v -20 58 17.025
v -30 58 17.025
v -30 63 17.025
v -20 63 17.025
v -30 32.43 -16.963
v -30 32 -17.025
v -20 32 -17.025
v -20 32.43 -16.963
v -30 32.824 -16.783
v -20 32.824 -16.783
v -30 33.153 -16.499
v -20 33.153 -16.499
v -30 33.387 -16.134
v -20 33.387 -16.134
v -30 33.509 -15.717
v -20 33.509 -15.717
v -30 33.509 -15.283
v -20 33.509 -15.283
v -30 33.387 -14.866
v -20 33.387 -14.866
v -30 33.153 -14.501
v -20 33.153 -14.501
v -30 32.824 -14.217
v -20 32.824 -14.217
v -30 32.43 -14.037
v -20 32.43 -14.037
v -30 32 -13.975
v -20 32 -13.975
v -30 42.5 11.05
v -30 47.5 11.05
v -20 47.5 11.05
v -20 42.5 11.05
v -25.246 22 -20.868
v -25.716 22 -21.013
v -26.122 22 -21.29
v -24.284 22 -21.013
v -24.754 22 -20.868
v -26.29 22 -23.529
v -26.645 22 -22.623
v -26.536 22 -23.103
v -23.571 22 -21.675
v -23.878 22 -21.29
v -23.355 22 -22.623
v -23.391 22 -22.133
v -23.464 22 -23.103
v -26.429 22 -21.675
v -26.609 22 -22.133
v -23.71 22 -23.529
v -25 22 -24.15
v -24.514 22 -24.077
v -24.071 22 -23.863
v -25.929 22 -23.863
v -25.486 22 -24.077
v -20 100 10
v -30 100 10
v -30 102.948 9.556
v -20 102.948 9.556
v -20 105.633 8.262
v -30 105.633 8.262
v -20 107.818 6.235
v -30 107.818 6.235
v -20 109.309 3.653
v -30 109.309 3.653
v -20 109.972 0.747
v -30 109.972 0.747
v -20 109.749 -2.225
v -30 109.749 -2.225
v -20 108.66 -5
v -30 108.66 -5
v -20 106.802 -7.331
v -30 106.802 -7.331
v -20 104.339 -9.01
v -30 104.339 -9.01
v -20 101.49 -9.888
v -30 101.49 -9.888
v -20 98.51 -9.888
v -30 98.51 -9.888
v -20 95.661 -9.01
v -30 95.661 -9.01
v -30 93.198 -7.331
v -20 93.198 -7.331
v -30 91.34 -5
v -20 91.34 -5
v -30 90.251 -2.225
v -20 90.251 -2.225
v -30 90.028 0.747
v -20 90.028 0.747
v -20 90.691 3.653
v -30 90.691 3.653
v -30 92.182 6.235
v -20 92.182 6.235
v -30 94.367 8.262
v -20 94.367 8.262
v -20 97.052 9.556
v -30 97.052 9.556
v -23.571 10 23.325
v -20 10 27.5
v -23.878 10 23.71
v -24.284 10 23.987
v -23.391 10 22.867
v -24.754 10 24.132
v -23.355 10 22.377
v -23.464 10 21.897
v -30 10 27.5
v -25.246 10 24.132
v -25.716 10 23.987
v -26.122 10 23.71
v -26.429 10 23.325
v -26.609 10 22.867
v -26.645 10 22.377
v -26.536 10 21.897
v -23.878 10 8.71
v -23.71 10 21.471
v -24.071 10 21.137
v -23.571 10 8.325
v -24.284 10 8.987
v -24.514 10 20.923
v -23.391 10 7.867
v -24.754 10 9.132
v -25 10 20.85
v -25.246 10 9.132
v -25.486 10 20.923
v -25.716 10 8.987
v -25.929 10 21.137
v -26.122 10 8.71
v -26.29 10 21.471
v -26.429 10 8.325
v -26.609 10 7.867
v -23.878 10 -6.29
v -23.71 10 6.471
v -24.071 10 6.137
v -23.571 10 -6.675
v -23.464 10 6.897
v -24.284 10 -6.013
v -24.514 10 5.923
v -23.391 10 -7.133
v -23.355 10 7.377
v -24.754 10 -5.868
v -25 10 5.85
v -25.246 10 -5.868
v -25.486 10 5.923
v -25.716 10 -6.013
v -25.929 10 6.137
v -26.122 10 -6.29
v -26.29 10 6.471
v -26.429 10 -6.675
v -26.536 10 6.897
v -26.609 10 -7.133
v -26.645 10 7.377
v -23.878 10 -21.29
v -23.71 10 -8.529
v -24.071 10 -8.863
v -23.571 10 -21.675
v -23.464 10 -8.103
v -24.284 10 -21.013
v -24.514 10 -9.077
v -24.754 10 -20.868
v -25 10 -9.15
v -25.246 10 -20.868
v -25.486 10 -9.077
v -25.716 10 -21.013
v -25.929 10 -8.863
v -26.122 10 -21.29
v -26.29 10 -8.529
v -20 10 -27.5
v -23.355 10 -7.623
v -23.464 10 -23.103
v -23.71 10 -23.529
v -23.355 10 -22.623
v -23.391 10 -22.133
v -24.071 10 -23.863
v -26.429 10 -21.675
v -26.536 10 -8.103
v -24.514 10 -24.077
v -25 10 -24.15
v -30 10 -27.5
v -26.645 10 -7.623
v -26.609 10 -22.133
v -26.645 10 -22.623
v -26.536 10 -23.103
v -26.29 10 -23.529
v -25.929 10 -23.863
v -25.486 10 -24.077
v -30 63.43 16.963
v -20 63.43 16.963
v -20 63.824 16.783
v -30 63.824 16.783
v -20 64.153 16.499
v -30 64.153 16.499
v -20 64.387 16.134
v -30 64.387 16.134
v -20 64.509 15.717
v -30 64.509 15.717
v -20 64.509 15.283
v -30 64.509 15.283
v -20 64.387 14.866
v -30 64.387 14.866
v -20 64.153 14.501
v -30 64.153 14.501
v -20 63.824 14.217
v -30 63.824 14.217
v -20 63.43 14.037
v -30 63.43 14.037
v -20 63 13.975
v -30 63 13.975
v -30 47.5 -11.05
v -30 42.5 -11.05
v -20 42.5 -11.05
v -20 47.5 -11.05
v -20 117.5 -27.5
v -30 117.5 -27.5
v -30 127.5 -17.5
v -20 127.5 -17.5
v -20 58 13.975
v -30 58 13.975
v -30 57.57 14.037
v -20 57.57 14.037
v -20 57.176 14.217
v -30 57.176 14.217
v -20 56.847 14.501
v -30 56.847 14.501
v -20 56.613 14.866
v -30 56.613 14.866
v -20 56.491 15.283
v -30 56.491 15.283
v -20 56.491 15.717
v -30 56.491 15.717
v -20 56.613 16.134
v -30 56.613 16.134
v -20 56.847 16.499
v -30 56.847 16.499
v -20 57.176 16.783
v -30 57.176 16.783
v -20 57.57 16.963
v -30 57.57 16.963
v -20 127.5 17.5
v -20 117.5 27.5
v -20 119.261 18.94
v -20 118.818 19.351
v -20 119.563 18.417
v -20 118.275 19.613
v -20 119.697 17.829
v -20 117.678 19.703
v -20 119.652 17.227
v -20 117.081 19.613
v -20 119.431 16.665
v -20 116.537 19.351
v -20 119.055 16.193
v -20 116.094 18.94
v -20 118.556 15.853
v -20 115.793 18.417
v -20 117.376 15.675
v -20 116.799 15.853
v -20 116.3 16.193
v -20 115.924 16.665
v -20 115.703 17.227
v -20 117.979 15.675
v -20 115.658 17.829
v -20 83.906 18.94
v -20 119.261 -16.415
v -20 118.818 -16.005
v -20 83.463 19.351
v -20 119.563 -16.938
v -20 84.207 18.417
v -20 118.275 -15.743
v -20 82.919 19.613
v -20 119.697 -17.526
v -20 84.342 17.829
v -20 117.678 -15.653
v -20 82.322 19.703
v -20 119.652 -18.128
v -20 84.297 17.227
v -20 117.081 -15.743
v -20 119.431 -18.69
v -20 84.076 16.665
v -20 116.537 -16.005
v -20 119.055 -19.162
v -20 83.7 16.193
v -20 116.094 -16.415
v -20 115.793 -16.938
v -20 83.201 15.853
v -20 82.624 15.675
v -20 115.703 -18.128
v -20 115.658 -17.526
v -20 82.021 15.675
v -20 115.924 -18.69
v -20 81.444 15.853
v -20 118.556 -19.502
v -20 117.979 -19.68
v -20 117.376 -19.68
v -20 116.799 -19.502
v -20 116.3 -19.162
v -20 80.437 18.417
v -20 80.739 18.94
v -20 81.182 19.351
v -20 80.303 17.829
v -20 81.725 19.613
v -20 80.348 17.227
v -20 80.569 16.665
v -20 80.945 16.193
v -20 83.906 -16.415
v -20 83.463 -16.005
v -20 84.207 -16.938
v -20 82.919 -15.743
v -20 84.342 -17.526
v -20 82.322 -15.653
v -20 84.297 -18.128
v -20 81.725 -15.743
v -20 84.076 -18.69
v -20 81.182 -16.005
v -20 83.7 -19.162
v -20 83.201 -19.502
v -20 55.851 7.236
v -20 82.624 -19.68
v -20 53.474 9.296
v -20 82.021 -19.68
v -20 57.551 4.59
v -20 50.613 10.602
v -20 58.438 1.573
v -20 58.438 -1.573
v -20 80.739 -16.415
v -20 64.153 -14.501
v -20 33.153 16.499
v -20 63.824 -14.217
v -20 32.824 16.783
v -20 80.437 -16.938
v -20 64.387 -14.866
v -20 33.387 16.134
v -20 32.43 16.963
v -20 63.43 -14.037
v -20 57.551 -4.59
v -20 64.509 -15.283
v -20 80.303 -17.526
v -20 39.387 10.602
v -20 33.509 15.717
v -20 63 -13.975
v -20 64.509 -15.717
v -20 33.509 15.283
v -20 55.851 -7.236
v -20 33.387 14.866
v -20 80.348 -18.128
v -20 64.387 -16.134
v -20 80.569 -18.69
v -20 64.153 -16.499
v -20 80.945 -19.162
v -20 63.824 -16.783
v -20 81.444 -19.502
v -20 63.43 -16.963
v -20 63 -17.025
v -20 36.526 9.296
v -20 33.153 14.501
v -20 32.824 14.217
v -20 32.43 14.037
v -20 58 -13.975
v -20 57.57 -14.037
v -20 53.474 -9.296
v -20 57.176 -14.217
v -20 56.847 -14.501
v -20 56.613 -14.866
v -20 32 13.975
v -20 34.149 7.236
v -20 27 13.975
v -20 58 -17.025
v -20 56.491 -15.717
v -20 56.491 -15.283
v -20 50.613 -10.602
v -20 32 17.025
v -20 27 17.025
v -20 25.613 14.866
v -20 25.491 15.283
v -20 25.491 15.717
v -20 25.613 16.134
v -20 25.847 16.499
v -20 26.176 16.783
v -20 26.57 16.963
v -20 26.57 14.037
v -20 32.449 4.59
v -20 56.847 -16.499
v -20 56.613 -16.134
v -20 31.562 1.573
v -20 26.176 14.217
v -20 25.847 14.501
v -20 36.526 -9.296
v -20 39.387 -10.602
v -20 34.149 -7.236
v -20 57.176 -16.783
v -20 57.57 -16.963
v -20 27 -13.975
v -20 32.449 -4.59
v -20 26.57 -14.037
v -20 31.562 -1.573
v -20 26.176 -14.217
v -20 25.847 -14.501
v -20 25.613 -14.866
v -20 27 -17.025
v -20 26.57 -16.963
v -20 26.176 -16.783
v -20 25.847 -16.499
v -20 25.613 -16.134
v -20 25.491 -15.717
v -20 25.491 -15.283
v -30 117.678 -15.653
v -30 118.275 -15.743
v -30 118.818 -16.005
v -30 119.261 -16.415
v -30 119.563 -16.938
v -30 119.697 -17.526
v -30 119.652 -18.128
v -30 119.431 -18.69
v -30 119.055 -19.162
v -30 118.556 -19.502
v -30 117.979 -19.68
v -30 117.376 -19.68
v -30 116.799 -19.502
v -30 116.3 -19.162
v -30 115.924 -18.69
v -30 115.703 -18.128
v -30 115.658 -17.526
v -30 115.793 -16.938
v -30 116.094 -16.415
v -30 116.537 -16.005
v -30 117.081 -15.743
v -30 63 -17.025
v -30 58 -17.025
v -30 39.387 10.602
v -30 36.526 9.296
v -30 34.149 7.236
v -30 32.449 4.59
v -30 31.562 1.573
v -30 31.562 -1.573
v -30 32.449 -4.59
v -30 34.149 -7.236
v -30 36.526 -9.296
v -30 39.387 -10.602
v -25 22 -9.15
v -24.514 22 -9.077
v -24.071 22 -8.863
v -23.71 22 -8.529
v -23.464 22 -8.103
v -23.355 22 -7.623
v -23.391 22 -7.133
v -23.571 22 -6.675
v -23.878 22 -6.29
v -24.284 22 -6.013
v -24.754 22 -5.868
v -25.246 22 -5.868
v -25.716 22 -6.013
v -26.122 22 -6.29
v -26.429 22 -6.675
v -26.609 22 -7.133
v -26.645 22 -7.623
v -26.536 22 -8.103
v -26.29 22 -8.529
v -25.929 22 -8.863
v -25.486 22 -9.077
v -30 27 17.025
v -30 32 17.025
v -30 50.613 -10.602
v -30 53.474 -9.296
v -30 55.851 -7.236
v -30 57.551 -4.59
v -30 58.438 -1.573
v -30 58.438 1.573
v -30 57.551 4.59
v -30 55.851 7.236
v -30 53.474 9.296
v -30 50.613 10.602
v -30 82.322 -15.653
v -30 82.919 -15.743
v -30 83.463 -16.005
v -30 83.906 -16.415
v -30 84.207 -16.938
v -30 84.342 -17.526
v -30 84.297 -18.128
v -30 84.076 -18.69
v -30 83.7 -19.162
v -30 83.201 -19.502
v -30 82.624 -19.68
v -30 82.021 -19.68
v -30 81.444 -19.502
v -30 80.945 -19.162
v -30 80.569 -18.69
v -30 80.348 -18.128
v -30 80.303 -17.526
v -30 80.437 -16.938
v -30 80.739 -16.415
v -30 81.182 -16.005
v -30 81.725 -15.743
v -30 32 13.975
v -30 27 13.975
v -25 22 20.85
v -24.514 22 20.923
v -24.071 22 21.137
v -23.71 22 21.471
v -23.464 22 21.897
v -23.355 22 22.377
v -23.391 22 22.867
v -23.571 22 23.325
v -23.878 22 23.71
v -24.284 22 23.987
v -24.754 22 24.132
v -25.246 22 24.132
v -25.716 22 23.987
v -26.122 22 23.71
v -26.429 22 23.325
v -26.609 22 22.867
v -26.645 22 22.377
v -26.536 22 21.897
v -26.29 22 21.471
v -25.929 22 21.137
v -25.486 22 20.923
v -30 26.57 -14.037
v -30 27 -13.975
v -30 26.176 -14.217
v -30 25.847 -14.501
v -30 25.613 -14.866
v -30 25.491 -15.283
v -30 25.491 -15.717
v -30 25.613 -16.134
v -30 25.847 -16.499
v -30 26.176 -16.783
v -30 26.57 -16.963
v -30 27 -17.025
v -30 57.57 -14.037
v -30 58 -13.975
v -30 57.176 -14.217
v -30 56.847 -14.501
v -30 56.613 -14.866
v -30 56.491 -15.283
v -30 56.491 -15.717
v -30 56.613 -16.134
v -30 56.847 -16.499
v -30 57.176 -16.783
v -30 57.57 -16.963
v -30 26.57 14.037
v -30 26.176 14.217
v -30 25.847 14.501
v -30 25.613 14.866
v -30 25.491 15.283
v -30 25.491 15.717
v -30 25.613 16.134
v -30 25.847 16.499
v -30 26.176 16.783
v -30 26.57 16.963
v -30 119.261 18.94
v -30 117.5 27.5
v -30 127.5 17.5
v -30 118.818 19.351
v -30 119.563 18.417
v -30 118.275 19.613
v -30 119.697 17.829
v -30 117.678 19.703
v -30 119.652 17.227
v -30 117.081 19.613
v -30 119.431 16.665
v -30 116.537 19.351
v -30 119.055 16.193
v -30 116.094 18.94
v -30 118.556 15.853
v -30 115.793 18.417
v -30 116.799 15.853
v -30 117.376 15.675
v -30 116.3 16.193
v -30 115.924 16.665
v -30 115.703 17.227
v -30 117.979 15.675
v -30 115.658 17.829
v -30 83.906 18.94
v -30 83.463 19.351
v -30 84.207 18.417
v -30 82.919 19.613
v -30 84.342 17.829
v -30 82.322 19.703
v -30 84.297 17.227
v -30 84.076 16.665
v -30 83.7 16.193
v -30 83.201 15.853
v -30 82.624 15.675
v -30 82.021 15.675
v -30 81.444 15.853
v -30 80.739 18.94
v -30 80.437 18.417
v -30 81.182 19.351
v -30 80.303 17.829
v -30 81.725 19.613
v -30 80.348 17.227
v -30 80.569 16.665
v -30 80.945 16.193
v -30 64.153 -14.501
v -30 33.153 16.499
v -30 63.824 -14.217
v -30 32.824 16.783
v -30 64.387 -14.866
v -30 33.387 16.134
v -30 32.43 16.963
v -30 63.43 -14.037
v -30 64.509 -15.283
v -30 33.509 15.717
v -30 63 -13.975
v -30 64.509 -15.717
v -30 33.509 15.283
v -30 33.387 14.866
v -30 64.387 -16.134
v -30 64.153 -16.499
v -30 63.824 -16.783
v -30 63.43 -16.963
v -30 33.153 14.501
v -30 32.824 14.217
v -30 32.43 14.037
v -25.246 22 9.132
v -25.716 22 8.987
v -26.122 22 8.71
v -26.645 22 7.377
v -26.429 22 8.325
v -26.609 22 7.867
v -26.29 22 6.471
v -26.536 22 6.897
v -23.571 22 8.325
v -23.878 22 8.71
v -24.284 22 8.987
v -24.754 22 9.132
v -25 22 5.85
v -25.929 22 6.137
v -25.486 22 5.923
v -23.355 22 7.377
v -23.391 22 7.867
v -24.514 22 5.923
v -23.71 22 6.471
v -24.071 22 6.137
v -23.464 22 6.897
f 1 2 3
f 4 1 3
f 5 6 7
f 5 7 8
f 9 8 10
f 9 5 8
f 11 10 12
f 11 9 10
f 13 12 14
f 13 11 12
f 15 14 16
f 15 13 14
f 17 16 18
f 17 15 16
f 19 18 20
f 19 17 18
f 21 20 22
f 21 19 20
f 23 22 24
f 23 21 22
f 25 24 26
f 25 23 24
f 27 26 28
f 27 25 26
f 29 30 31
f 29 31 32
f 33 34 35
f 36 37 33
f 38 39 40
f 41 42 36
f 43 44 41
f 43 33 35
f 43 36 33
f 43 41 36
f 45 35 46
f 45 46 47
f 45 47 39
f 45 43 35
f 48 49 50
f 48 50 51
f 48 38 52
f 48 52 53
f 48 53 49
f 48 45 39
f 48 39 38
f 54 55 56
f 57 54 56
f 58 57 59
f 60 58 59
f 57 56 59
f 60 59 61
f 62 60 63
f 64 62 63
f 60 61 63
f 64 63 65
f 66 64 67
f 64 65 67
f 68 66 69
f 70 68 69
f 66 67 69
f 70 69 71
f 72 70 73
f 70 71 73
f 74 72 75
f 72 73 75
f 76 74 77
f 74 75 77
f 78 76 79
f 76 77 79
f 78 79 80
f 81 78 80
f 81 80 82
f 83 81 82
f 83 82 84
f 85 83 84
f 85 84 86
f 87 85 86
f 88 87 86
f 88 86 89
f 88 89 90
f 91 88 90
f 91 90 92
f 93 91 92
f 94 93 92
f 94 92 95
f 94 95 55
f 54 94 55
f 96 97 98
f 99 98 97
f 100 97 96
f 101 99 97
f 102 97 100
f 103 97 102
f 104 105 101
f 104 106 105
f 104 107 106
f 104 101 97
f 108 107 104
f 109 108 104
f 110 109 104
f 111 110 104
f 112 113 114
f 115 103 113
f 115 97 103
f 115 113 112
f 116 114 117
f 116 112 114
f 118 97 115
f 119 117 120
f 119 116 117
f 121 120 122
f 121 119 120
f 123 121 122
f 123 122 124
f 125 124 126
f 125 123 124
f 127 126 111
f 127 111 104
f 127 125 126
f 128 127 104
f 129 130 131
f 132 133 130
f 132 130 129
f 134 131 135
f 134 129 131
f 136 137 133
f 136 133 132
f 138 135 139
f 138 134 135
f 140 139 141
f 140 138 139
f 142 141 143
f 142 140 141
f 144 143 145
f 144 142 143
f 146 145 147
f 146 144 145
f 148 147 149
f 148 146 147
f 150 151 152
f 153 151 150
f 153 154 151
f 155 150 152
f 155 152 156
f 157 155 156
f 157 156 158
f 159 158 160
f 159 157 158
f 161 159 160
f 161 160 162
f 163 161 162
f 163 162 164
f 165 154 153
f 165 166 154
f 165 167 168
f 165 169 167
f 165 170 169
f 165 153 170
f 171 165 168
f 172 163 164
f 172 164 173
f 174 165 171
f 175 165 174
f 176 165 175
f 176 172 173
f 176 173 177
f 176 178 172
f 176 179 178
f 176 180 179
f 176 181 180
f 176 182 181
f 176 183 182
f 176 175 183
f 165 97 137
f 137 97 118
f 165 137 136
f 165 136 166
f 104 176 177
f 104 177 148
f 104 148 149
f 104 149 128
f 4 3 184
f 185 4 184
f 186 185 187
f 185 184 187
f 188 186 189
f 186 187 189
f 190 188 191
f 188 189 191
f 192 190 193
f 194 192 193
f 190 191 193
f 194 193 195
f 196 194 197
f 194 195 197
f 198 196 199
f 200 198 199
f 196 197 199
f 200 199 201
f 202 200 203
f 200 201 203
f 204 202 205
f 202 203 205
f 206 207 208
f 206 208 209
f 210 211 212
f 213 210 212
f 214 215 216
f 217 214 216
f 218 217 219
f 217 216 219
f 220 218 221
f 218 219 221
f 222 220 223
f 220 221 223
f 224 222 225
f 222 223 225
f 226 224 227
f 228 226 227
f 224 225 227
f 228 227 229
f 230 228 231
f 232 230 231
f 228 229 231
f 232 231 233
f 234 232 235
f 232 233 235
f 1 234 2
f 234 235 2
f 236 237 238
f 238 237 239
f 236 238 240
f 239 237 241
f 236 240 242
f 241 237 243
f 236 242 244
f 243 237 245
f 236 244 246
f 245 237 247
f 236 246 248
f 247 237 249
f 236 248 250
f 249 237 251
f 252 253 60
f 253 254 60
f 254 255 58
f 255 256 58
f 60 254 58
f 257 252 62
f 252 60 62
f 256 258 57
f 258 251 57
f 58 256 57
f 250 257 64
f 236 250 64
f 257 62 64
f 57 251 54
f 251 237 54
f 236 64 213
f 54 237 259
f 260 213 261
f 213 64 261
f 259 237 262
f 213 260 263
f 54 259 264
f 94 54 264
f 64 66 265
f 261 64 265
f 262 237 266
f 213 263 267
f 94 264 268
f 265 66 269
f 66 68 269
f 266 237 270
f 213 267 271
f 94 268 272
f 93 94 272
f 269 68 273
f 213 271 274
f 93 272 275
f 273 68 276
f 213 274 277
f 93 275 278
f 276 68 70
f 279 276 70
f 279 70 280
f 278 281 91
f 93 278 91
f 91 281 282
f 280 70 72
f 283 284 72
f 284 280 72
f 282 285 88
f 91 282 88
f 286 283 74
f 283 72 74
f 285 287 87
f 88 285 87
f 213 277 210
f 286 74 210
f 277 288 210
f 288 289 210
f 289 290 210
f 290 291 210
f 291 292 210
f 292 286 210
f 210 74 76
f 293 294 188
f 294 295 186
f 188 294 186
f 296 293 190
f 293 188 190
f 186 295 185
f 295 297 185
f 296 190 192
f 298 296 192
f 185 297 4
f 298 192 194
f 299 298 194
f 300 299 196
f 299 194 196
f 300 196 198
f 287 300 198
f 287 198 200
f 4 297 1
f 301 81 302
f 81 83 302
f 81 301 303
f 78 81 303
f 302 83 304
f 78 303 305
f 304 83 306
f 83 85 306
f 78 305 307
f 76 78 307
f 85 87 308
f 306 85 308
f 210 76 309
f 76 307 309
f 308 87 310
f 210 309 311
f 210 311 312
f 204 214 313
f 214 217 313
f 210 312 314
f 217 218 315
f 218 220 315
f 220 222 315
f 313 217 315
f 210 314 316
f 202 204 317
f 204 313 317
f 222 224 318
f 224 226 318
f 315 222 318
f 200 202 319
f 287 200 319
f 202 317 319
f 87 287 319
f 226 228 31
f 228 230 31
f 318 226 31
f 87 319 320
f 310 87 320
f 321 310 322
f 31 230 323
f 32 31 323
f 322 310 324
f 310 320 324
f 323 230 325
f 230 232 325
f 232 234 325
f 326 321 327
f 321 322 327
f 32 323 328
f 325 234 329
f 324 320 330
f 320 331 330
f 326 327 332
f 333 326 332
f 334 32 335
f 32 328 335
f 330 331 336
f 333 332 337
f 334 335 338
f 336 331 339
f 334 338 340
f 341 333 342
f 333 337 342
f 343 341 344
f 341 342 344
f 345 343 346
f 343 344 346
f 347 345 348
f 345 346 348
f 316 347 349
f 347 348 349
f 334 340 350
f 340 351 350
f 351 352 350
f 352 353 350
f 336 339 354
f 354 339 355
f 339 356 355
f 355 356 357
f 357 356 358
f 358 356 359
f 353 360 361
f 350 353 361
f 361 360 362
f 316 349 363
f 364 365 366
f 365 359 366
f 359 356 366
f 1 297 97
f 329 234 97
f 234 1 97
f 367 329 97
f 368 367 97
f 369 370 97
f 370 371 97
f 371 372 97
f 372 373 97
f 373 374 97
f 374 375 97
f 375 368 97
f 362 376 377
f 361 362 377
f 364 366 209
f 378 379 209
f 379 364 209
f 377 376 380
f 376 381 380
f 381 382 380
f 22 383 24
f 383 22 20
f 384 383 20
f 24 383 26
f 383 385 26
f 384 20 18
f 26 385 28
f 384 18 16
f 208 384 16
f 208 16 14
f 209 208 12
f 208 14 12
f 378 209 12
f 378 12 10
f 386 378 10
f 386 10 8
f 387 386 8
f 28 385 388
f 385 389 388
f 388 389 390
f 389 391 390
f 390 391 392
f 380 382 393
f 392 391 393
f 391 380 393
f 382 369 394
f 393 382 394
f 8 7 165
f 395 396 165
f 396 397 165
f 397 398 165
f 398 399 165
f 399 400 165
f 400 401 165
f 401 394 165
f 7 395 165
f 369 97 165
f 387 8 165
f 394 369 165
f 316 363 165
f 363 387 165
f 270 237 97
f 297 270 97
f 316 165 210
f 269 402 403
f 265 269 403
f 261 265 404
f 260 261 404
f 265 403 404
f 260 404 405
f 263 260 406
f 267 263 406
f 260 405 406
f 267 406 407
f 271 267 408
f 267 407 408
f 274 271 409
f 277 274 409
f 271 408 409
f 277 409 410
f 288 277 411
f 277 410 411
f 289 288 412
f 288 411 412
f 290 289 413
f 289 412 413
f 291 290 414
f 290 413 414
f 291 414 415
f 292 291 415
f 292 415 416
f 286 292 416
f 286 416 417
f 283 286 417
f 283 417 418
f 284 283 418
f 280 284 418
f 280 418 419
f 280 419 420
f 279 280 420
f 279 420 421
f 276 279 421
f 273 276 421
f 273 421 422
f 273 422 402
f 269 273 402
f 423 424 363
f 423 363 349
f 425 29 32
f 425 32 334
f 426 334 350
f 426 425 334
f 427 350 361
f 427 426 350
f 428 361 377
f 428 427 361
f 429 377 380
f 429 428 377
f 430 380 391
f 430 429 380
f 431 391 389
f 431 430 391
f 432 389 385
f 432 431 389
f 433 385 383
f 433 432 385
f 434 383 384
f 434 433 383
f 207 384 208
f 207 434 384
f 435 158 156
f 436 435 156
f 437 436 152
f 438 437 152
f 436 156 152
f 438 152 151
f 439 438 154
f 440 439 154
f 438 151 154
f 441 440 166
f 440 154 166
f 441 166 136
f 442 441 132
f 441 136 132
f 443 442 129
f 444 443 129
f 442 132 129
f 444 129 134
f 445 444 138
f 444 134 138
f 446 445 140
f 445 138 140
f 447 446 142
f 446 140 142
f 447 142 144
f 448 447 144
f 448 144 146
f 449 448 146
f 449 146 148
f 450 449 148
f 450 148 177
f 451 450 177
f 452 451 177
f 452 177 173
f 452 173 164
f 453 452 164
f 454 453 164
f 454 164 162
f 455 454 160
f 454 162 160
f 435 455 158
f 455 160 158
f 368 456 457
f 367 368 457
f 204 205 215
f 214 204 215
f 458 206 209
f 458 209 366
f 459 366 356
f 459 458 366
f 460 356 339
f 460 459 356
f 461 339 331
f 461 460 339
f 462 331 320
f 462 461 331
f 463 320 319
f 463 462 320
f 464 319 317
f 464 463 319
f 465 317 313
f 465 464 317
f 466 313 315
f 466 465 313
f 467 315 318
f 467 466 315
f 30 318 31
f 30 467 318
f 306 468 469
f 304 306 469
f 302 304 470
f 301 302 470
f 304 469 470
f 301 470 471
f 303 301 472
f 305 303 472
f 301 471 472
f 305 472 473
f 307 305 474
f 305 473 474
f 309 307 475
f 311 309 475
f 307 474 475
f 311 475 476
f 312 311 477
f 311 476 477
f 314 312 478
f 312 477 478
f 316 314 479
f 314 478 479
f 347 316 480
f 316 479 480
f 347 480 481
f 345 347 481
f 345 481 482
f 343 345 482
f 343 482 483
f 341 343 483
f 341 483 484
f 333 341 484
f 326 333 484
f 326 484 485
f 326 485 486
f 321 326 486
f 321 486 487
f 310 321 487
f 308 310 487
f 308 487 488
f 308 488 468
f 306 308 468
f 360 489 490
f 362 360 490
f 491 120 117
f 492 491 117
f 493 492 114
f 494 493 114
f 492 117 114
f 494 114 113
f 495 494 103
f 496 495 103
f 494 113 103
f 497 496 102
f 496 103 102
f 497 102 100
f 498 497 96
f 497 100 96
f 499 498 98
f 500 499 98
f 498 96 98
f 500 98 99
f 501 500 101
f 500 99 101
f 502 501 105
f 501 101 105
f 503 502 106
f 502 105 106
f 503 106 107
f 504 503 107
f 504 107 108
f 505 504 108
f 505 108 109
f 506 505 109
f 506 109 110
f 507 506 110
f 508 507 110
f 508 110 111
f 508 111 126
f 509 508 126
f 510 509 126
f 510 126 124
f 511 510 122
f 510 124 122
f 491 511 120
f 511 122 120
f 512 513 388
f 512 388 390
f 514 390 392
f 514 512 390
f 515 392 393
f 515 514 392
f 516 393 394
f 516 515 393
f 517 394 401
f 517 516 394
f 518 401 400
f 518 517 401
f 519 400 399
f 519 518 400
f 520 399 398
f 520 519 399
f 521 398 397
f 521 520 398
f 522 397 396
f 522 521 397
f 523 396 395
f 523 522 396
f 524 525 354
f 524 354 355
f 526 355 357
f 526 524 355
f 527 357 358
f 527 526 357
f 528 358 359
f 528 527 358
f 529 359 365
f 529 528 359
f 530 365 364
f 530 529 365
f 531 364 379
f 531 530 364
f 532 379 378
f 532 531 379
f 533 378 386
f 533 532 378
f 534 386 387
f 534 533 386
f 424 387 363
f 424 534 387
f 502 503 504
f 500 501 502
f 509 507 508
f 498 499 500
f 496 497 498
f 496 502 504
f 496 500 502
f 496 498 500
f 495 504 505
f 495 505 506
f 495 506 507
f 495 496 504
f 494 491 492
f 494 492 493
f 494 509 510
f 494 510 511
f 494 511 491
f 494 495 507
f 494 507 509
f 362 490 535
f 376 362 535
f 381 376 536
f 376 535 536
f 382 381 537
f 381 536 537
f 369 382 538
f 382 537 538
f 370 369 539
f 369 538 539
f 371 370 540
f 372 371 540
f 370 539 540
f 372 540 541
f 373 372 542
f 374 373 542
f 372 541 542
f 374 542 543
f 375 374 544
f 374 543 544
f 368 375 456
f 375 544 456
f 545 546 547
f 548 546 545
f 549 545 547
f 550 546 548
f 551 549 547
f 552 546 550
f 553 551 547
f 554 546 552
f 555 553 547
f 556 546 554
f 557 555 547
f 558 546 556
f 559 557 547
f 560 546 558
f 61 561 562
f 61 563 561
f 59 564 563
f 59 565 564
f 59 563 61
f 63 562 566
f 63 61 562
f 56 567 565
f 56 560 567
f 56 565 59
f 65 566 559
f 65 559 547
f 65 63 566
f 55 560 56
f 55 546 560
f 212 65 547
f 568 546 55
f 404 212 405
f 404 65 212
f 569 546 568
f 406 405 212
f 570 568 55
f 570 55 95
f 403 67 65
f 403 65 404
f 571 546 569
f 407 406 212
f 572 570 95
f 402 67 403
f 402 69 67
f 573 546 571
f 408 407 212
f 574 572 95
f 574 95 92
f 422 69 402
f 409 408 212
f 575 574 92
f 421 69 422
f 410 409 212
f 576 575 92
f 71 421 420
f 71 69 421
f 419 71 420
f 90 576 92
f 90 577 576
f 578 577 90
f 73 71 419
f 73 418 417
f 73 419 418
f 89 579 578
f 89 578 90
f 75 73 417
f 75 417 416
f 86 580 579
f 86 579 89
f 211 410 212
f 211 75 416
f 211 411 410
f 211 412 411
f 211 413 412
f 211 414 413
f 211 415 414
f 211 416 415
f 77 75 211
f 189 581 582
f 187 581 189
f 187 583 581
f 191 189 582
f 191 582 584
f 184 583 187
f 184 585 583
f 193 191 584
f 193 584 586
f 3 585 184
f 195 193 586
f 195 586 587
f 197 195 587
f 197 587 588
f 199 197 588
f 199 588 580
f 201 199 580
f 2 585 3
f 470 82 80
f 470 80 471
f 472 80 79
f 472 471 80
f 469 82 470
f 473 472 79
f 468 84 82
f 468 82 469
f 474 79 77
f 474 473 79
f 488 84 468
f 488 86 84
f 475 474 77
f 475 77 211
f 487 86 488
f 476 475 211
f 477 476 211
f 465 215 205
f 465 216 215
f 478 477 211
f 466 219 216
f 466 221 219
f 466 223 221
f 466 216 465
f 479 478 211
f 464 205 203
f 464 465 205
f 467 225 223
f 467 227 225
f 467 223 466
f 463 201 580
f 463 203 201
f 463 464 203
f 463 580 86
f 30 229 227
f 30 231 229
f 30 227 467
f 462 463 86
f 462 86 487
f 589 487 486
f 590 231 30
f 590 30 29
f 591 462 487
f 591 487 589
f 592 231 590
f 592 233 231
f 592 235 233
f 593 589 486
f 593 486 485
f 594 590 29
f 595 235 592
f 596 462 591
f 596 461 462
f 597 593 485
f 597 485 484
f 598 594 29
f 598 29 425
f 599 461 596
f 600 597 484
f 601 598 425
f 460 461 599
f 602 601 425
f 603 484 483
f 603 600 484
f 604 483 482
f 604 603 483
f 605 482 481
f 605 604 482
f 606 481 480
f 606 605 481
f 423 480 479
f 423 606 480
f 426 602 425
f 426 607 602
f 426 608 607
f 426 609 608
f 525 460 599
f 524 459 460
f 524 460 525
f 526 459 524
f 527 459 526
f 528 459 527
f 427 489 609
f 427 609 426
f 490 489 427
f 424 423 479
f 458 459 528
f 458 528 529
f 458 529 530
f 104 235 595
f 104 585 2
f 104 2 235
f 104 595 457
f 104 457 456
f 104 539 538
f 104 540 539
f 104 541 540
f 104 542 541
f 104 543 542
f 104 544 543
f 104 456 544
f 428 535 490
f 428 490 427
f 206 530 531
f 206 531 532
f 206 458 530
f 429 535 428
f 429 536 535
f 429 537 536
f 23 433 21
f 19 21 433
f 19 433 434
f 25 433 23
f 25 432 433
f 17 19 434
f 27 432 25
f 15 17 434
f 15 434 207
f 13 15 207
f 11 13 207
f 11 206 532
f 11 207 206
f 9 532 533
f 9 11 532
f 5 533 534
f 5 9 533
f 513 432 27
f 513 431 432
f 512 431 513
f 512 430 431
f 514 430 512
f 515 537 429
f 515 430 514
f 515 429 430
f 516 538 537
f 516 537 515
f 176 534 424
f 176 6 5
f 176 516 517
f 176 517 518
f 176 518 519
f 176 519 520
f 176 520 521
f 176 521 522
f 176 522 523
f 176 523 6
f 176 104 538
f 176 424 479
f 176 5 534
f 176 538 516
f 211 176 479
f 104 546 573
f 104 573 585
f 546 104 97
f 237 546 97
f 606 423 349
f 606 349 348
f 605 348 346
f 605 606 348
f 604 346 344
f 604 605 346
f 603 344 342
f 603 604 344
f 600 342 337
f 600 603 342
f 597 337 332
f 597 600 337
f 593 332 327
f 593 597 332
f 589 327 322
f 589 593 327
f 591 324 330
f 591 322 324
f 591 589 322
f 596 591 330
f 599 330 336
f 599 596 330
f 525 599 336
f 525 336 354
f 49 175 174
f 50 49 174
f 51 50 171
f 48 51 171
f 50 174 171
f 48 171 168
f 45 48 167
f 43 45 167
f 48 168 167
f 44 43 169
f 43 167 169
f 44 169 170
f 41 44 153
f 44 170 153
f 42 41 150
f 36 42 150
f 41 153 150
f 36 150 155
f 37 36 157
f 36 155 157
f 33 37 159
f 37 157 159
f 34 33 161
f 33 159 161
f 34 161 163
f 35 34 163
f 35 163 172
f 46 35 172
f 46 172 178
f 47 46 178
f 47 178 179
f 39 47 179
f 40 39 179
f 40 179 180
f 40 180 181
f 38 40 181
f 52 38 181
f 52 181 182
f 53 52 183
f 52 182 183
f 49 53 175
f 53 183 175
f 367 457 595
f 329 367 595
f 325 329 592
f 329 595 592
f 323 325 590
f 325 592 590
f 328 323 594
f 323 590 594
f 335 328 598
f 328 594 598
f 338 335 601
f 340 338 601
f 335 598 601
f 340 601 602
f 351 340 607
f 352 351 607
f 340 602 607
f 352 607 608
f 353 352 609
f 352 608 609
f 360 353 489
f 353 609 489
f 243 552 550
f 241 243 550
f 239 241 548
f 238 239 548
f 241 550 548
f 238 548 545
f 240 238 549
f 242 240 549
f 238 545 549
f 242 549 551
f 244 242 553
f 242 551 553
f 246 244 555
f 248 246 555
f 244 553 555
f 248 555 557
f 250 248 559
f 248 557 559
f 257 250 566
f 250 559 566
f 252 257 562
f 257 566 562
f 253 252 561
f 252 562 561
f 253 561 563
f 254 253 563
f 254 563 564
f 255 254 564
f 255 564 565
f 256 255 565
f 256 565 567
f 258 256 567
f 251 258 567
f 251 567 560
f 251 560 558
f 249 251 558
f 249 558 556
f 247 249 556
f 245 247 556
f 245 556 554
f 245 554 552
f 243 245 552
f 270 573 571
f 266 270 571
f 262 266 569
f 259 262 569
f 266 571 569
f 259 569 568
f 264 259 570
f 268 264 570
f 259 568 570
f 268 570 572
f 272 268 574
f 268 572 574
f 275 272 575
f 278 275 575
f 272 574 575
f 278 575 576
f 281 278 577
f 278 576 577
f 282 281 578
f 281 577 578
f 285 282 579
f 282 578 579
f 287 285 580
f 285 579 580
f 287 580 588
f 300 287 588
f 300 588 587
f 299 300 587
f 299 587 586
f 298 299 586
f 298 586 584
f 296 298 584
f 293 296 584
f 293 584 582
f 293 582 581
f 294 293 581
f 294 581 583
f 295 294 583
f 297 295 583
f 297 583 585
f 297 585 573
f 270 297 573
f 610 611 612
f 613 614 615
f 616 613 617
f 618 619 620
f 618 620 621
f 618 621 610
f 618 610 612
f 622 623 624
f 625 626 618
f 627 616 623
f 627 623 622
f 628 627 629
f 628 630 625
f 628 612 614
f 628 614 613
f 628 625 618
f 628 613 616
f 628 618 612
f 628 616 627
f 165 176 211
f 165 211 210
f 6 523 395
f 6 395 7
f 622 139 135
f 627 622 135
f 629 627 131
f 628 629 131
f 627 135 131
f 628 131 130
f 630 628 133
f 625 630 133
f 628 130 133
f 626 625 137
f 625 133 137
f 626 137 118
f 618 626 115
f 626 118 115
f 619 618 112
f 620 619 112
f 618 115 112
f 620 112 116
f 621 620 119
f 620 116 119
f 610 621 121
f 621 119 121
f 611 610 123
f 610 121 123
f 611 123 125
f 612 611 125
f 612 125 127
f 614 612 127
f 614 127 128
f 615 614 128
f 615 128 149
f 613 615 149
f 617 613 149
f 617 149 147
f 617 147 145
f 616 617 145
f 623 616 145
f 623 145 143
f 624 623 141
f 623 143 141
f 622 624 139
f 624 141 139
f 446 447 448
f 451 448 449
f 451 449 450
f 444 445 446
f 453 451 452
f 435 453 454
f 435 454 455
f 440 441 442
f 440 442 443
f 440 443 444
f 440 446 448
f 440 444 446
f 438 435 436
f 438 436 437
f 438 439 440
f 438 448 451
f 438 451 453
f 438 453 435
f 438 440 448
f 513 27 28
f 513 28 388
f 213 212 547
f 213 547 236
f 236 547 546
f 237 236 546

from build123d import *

# Parameters (mm, degrees)
SKETCH_1_R          = 2
SKETCH_1_R_2        = 1.5
SKETCH_1_W          = 10
SKETCH_1_H          = 55
EXTRUDE_1_DEPTH     = 10
SKETCH_2_W          = 10
SKETCH_2_H          = 55
EXTRUDE_2_DEPTH     = 117.5
SKETCH_3_R          = 2.025
SKETCH_3_R_2        = 10
CUT_EXTRUDE_1_DEPTH = 143.543852901
CUT_EXTRUDE_2_DEPTH = 143.543852901
SKETCH_6_W          = 57.5
SKETCH_6_H          = 10
CUT_EXTRUDE_3_DEPTH = 143.060726452
SKETCH_7_R          = 1.65
CUT_EXTRUDE_4_DEPTH = 12


with BuildPart() as part:
    # 草图1 → 凸台-拉伸1 (new body)
    # profile 1 of 3: a face of its own
    with BuildSketch(Plane(origin=(0, 0, 0), x_dir=(1, 0, 0), z_dir=(0, 1, 0))):
        with BuildLine():
            ThreePointArc((0, -27.5), (27.5, 0), (0, 27.5))
            Line((0, 27.5), (-20, 27.5))
            Line((-20, 27.5), (-20, -27.5))
            Line((-20, -27.5), (0, -27.5))
        make_face()
        with Locations(Location((-15, -23.75, 0), (0, 0, 270))):
            Circle(SKETCH_1_R, mode=Mode.SUBTRACT)
        with Locations(Location((-8.876760389, -5.125, 0), (0, 0, 270))):
            Circle(SKETCH_1_R_2, mode=Mode.SUBTRACT)
        with Locations(Location((0, -10.25, 0), (0, 0, 270))):
            Circle(SKETCH_1_R_2, mode=Mode.SUBTRACT)
        with Locations(Location((8.876760389, -5.125, 0), (0, 0, 270))):
            Circle(SKETCH_1_R_2, mode=Mode.SUBTRACT)
        with Locations(Location((-8.876760389, 5.125, 0), (0, 0, 270))):
            Circle(SKETCH_1_R_2, mode=Mode.SUBTRACT)
        with Locations(Location((-15, 23.75, 0), (0, 0, 270))):
            Circle(SKETCH_1_R, mode=Mode.SUBTRACT)
        with Locations(Location((8.876760389, 5.125, 0), (0, 0, 270))):
            Circle(SKETCH_1_R_2, mode=Mode.SUBTRACT)
        with Locations(Location((0, 10.25, 0), (0, 0, 270))):
            Circle(SKETCH_1_R_2, mode=Mode.SUBTRACT)
    # profile 2 of 3: a face of its own
    with BuildSketch(Plane(origin=(0, 0, 0), x_dir=(1, 0, 0), z_dir=(0, 1, 0))):
        with BuildLine():
            ThreePointArc((0, -27.5), (27.5, 0), (0, 27.5))
            Line((0, 27.5), (-20, 27.5))
            Line((-20, 27.5), (-20, -27.5))
            Line((-20, -27.5), (0, -27.5))
        make_face()
        with Locations(Location((-15, -23.75, 0), (0, 0, 270))):
            Circle(SKETCH_1_R, mode=Mode.SUBTRACT)
        with Locations(Location((-8.876760389, -5.125, 0), (0, 0, 270))):
            Circle(SKETCH_1_R_2, mode=Mode.SUBTRACT)
        with Locations(Location((0, -10.25, 0), (0, 0, 270))):
            Circle(SKETCH_1_R_2, mode=Mode.SUBTRACT)
        with Locations(Location((8.876760389, -5.125, 0), (0, 0, 270))):
            Circle(SKETCH_1_R_2, mode=Mode.SUBTRACT)
        with Locations(Location((-8.876760389, 5.125, 0), (0, 0, 270))):
            Circle(SKETCH_1_R_2, mode=Mode.SUBTRACT)
        with Locations(Location((-15, 23.75, 0), (0, 0, 270))):
            Circle(SKETCH_1_R, mode=Mode.SUBTRACT)
        with Locations(Location((8.876760389, 5.125, 0), (0, 0, 270))):
            Circle(SKETCH_1_R_2, mode=Mode.SUBTRACT)
        with Locations(Location((0, 10.25, 0), (0, 0, 270))):
            Circle(SKETCH_1_R_2, mode=Mode.SUBTRACT)
    # profile 3 of 3: a face of its own
    with BuildSketch(Plane(origin=(0, 0, 0), x_dir=(1, 0, 0), z_dir=(0, 1, 0))):
        with Locations((-25, 0)):
            Rectangle(SKETCH_1_W, SKETCH_1_H)
    extrude(amount=EXTRUDE_1_DEPTH)

    # 草图2 → 凸台-拉伸2 (add)
    with BuildSketch(Plane(origin=(0, 10, 0), x_dir=(1, 0, 0), z_dir=(0, 1, 0))):
        with Locations((-25, 0)):
            Rectangle(SKETCH_2_W, SKETCH_2_H)
    extrude(amount=EXTRUDE_2_DEPTH)

    # 草图3 → 切除-拉伸1 (cut, through all)
    with BuildSketch(Plane.ZY.offset(30)):
        with Locations((-17.67766953, 117.67766953)):
            Circle(SKETCH_3_R)
        with Locations((17.67766953, 117.67766953)):
            Circle(SKETCH_3_R)
        with Locations((17.67766953, 82.32233047)):
            Circle(SKETCH_3_R)
        with Locations((-17.67766953, 82.32233047)):
            Circle(SKETCH_3_R)
        with Locations((0, 100)):
            Circle(SKETCH_3_R_2)
        with BuildLine():
            Line((-13.975, 63), (-13.975, 58))
            ThreePointArc((-13.975, 58), (-15.5, 56.475), (-17.025, 58))
            Line((-17.025, 58), (-17.025, 63))
            ThreePointArc((-17.025, 63), (-15.5, 64.525), (-13.975, 63))
        make_face()
        with BuildLine():
            Line((-13.975, 32), (-13.975, 27))
            ThreePointArc((-13.975, 27), (-15.5, 25.475), (-17.025, 27))
            Line((-17.025, 27), (-17.025, 32))
            ThreePointArc((-17.025, 32), (-15.5, 33.525), (-13.975, 32))
        make_face()
        with BuildLine():
            Line((13.975, 63), (13.975, 58))
            ThreePointArc((13.975, 58), (15.5, 56.475), (17.025, 58))
            Line((17.025, 58), (17.025, 63))
            ThreePointArc((17.025, 63), (15.5, 64.525), (13.975, 63))
        make_face()
        with BuildLine():
            Line((13.975, 32), (13.975, 27))
            ThreePointArc((13.975, 27), (15.5, 25.475), (17.025, 27))
            Line((17.025, 27), (17.025, 32))
            ThreePointArc((17.025, 32), (15.5, 33.525), (13.975, 32))
        make_face()
        with BuildLine():
            Line((11.05, 47.5), (11.05, 42.5))
            ThreePointArc((11.05, 42.5), (0, 31.45), (-11.05, 42.5))
            Line((-11.05, 42.5), (-11.05, 47.5))
            ThreePointArc((-11.05, 47.5), (0, 58.55), (11.05, 47.5))
        make_face()
    extrude(amount=-CUT_EXTRUDE_1_DEPTH, mode=Mode.SUBTRACT)

    # 草图5 → 切除-拉伸2 (cut, through all)
    with BuildSketch(Plane.ZY.offset(30)):
        Polygon((-27.5, 117.5), (-17.5, 127.5), (-27.5, 127.5), align=None)
        Polygon((27.5, 117.5), (27.5, 127.5), (17.5, 127.5), align=None)
    extrude(amount=-CUT_EXTRUDE_2_DEPTH, mode=Mode.SUBTRACT)

    # 草图6 → 切除-拉伸3 (cut, through all)
    with BuildSketch(Plane(origin=(0, 0, -27.5), x_dir=(-1, 0, 0), z_dir=(0, 0, -1))):
        with Locations((1.25, 5)):
            Rectangle(SKETCH_6_W, SKETCH_6_H)
    extrude(amount=-CUT_EXTRUDE_3_DEPTH, mode=Mode.SUBTRACT)

    # 草图7 → 切除-拉伸4 (cut)
    with BuildSketch(Plane.XZ.offset(-10)):
        with Locations(Location((-25, 22.5, 0), (0, 0, 270))):
            Circle(SKETCH_7_R)
        with Locations(Location((-25, 7.5, 0), (0, 0, 270))):
            Circle(SKETCH_7_R)
        with Locations(Location((-25, -7.5, 0), (0, 0, 270))):
            Circle(SKETCH_7_R)
        with Locations(Location((-25, -22.5, 0), (0, 0, 270))):
            Circle(SKETCH_7_R)
    extrude(amount=-CUT_EXTRUDE_4_DEPTH, mode=Mode.SUBTRACT)


solid = part.part
